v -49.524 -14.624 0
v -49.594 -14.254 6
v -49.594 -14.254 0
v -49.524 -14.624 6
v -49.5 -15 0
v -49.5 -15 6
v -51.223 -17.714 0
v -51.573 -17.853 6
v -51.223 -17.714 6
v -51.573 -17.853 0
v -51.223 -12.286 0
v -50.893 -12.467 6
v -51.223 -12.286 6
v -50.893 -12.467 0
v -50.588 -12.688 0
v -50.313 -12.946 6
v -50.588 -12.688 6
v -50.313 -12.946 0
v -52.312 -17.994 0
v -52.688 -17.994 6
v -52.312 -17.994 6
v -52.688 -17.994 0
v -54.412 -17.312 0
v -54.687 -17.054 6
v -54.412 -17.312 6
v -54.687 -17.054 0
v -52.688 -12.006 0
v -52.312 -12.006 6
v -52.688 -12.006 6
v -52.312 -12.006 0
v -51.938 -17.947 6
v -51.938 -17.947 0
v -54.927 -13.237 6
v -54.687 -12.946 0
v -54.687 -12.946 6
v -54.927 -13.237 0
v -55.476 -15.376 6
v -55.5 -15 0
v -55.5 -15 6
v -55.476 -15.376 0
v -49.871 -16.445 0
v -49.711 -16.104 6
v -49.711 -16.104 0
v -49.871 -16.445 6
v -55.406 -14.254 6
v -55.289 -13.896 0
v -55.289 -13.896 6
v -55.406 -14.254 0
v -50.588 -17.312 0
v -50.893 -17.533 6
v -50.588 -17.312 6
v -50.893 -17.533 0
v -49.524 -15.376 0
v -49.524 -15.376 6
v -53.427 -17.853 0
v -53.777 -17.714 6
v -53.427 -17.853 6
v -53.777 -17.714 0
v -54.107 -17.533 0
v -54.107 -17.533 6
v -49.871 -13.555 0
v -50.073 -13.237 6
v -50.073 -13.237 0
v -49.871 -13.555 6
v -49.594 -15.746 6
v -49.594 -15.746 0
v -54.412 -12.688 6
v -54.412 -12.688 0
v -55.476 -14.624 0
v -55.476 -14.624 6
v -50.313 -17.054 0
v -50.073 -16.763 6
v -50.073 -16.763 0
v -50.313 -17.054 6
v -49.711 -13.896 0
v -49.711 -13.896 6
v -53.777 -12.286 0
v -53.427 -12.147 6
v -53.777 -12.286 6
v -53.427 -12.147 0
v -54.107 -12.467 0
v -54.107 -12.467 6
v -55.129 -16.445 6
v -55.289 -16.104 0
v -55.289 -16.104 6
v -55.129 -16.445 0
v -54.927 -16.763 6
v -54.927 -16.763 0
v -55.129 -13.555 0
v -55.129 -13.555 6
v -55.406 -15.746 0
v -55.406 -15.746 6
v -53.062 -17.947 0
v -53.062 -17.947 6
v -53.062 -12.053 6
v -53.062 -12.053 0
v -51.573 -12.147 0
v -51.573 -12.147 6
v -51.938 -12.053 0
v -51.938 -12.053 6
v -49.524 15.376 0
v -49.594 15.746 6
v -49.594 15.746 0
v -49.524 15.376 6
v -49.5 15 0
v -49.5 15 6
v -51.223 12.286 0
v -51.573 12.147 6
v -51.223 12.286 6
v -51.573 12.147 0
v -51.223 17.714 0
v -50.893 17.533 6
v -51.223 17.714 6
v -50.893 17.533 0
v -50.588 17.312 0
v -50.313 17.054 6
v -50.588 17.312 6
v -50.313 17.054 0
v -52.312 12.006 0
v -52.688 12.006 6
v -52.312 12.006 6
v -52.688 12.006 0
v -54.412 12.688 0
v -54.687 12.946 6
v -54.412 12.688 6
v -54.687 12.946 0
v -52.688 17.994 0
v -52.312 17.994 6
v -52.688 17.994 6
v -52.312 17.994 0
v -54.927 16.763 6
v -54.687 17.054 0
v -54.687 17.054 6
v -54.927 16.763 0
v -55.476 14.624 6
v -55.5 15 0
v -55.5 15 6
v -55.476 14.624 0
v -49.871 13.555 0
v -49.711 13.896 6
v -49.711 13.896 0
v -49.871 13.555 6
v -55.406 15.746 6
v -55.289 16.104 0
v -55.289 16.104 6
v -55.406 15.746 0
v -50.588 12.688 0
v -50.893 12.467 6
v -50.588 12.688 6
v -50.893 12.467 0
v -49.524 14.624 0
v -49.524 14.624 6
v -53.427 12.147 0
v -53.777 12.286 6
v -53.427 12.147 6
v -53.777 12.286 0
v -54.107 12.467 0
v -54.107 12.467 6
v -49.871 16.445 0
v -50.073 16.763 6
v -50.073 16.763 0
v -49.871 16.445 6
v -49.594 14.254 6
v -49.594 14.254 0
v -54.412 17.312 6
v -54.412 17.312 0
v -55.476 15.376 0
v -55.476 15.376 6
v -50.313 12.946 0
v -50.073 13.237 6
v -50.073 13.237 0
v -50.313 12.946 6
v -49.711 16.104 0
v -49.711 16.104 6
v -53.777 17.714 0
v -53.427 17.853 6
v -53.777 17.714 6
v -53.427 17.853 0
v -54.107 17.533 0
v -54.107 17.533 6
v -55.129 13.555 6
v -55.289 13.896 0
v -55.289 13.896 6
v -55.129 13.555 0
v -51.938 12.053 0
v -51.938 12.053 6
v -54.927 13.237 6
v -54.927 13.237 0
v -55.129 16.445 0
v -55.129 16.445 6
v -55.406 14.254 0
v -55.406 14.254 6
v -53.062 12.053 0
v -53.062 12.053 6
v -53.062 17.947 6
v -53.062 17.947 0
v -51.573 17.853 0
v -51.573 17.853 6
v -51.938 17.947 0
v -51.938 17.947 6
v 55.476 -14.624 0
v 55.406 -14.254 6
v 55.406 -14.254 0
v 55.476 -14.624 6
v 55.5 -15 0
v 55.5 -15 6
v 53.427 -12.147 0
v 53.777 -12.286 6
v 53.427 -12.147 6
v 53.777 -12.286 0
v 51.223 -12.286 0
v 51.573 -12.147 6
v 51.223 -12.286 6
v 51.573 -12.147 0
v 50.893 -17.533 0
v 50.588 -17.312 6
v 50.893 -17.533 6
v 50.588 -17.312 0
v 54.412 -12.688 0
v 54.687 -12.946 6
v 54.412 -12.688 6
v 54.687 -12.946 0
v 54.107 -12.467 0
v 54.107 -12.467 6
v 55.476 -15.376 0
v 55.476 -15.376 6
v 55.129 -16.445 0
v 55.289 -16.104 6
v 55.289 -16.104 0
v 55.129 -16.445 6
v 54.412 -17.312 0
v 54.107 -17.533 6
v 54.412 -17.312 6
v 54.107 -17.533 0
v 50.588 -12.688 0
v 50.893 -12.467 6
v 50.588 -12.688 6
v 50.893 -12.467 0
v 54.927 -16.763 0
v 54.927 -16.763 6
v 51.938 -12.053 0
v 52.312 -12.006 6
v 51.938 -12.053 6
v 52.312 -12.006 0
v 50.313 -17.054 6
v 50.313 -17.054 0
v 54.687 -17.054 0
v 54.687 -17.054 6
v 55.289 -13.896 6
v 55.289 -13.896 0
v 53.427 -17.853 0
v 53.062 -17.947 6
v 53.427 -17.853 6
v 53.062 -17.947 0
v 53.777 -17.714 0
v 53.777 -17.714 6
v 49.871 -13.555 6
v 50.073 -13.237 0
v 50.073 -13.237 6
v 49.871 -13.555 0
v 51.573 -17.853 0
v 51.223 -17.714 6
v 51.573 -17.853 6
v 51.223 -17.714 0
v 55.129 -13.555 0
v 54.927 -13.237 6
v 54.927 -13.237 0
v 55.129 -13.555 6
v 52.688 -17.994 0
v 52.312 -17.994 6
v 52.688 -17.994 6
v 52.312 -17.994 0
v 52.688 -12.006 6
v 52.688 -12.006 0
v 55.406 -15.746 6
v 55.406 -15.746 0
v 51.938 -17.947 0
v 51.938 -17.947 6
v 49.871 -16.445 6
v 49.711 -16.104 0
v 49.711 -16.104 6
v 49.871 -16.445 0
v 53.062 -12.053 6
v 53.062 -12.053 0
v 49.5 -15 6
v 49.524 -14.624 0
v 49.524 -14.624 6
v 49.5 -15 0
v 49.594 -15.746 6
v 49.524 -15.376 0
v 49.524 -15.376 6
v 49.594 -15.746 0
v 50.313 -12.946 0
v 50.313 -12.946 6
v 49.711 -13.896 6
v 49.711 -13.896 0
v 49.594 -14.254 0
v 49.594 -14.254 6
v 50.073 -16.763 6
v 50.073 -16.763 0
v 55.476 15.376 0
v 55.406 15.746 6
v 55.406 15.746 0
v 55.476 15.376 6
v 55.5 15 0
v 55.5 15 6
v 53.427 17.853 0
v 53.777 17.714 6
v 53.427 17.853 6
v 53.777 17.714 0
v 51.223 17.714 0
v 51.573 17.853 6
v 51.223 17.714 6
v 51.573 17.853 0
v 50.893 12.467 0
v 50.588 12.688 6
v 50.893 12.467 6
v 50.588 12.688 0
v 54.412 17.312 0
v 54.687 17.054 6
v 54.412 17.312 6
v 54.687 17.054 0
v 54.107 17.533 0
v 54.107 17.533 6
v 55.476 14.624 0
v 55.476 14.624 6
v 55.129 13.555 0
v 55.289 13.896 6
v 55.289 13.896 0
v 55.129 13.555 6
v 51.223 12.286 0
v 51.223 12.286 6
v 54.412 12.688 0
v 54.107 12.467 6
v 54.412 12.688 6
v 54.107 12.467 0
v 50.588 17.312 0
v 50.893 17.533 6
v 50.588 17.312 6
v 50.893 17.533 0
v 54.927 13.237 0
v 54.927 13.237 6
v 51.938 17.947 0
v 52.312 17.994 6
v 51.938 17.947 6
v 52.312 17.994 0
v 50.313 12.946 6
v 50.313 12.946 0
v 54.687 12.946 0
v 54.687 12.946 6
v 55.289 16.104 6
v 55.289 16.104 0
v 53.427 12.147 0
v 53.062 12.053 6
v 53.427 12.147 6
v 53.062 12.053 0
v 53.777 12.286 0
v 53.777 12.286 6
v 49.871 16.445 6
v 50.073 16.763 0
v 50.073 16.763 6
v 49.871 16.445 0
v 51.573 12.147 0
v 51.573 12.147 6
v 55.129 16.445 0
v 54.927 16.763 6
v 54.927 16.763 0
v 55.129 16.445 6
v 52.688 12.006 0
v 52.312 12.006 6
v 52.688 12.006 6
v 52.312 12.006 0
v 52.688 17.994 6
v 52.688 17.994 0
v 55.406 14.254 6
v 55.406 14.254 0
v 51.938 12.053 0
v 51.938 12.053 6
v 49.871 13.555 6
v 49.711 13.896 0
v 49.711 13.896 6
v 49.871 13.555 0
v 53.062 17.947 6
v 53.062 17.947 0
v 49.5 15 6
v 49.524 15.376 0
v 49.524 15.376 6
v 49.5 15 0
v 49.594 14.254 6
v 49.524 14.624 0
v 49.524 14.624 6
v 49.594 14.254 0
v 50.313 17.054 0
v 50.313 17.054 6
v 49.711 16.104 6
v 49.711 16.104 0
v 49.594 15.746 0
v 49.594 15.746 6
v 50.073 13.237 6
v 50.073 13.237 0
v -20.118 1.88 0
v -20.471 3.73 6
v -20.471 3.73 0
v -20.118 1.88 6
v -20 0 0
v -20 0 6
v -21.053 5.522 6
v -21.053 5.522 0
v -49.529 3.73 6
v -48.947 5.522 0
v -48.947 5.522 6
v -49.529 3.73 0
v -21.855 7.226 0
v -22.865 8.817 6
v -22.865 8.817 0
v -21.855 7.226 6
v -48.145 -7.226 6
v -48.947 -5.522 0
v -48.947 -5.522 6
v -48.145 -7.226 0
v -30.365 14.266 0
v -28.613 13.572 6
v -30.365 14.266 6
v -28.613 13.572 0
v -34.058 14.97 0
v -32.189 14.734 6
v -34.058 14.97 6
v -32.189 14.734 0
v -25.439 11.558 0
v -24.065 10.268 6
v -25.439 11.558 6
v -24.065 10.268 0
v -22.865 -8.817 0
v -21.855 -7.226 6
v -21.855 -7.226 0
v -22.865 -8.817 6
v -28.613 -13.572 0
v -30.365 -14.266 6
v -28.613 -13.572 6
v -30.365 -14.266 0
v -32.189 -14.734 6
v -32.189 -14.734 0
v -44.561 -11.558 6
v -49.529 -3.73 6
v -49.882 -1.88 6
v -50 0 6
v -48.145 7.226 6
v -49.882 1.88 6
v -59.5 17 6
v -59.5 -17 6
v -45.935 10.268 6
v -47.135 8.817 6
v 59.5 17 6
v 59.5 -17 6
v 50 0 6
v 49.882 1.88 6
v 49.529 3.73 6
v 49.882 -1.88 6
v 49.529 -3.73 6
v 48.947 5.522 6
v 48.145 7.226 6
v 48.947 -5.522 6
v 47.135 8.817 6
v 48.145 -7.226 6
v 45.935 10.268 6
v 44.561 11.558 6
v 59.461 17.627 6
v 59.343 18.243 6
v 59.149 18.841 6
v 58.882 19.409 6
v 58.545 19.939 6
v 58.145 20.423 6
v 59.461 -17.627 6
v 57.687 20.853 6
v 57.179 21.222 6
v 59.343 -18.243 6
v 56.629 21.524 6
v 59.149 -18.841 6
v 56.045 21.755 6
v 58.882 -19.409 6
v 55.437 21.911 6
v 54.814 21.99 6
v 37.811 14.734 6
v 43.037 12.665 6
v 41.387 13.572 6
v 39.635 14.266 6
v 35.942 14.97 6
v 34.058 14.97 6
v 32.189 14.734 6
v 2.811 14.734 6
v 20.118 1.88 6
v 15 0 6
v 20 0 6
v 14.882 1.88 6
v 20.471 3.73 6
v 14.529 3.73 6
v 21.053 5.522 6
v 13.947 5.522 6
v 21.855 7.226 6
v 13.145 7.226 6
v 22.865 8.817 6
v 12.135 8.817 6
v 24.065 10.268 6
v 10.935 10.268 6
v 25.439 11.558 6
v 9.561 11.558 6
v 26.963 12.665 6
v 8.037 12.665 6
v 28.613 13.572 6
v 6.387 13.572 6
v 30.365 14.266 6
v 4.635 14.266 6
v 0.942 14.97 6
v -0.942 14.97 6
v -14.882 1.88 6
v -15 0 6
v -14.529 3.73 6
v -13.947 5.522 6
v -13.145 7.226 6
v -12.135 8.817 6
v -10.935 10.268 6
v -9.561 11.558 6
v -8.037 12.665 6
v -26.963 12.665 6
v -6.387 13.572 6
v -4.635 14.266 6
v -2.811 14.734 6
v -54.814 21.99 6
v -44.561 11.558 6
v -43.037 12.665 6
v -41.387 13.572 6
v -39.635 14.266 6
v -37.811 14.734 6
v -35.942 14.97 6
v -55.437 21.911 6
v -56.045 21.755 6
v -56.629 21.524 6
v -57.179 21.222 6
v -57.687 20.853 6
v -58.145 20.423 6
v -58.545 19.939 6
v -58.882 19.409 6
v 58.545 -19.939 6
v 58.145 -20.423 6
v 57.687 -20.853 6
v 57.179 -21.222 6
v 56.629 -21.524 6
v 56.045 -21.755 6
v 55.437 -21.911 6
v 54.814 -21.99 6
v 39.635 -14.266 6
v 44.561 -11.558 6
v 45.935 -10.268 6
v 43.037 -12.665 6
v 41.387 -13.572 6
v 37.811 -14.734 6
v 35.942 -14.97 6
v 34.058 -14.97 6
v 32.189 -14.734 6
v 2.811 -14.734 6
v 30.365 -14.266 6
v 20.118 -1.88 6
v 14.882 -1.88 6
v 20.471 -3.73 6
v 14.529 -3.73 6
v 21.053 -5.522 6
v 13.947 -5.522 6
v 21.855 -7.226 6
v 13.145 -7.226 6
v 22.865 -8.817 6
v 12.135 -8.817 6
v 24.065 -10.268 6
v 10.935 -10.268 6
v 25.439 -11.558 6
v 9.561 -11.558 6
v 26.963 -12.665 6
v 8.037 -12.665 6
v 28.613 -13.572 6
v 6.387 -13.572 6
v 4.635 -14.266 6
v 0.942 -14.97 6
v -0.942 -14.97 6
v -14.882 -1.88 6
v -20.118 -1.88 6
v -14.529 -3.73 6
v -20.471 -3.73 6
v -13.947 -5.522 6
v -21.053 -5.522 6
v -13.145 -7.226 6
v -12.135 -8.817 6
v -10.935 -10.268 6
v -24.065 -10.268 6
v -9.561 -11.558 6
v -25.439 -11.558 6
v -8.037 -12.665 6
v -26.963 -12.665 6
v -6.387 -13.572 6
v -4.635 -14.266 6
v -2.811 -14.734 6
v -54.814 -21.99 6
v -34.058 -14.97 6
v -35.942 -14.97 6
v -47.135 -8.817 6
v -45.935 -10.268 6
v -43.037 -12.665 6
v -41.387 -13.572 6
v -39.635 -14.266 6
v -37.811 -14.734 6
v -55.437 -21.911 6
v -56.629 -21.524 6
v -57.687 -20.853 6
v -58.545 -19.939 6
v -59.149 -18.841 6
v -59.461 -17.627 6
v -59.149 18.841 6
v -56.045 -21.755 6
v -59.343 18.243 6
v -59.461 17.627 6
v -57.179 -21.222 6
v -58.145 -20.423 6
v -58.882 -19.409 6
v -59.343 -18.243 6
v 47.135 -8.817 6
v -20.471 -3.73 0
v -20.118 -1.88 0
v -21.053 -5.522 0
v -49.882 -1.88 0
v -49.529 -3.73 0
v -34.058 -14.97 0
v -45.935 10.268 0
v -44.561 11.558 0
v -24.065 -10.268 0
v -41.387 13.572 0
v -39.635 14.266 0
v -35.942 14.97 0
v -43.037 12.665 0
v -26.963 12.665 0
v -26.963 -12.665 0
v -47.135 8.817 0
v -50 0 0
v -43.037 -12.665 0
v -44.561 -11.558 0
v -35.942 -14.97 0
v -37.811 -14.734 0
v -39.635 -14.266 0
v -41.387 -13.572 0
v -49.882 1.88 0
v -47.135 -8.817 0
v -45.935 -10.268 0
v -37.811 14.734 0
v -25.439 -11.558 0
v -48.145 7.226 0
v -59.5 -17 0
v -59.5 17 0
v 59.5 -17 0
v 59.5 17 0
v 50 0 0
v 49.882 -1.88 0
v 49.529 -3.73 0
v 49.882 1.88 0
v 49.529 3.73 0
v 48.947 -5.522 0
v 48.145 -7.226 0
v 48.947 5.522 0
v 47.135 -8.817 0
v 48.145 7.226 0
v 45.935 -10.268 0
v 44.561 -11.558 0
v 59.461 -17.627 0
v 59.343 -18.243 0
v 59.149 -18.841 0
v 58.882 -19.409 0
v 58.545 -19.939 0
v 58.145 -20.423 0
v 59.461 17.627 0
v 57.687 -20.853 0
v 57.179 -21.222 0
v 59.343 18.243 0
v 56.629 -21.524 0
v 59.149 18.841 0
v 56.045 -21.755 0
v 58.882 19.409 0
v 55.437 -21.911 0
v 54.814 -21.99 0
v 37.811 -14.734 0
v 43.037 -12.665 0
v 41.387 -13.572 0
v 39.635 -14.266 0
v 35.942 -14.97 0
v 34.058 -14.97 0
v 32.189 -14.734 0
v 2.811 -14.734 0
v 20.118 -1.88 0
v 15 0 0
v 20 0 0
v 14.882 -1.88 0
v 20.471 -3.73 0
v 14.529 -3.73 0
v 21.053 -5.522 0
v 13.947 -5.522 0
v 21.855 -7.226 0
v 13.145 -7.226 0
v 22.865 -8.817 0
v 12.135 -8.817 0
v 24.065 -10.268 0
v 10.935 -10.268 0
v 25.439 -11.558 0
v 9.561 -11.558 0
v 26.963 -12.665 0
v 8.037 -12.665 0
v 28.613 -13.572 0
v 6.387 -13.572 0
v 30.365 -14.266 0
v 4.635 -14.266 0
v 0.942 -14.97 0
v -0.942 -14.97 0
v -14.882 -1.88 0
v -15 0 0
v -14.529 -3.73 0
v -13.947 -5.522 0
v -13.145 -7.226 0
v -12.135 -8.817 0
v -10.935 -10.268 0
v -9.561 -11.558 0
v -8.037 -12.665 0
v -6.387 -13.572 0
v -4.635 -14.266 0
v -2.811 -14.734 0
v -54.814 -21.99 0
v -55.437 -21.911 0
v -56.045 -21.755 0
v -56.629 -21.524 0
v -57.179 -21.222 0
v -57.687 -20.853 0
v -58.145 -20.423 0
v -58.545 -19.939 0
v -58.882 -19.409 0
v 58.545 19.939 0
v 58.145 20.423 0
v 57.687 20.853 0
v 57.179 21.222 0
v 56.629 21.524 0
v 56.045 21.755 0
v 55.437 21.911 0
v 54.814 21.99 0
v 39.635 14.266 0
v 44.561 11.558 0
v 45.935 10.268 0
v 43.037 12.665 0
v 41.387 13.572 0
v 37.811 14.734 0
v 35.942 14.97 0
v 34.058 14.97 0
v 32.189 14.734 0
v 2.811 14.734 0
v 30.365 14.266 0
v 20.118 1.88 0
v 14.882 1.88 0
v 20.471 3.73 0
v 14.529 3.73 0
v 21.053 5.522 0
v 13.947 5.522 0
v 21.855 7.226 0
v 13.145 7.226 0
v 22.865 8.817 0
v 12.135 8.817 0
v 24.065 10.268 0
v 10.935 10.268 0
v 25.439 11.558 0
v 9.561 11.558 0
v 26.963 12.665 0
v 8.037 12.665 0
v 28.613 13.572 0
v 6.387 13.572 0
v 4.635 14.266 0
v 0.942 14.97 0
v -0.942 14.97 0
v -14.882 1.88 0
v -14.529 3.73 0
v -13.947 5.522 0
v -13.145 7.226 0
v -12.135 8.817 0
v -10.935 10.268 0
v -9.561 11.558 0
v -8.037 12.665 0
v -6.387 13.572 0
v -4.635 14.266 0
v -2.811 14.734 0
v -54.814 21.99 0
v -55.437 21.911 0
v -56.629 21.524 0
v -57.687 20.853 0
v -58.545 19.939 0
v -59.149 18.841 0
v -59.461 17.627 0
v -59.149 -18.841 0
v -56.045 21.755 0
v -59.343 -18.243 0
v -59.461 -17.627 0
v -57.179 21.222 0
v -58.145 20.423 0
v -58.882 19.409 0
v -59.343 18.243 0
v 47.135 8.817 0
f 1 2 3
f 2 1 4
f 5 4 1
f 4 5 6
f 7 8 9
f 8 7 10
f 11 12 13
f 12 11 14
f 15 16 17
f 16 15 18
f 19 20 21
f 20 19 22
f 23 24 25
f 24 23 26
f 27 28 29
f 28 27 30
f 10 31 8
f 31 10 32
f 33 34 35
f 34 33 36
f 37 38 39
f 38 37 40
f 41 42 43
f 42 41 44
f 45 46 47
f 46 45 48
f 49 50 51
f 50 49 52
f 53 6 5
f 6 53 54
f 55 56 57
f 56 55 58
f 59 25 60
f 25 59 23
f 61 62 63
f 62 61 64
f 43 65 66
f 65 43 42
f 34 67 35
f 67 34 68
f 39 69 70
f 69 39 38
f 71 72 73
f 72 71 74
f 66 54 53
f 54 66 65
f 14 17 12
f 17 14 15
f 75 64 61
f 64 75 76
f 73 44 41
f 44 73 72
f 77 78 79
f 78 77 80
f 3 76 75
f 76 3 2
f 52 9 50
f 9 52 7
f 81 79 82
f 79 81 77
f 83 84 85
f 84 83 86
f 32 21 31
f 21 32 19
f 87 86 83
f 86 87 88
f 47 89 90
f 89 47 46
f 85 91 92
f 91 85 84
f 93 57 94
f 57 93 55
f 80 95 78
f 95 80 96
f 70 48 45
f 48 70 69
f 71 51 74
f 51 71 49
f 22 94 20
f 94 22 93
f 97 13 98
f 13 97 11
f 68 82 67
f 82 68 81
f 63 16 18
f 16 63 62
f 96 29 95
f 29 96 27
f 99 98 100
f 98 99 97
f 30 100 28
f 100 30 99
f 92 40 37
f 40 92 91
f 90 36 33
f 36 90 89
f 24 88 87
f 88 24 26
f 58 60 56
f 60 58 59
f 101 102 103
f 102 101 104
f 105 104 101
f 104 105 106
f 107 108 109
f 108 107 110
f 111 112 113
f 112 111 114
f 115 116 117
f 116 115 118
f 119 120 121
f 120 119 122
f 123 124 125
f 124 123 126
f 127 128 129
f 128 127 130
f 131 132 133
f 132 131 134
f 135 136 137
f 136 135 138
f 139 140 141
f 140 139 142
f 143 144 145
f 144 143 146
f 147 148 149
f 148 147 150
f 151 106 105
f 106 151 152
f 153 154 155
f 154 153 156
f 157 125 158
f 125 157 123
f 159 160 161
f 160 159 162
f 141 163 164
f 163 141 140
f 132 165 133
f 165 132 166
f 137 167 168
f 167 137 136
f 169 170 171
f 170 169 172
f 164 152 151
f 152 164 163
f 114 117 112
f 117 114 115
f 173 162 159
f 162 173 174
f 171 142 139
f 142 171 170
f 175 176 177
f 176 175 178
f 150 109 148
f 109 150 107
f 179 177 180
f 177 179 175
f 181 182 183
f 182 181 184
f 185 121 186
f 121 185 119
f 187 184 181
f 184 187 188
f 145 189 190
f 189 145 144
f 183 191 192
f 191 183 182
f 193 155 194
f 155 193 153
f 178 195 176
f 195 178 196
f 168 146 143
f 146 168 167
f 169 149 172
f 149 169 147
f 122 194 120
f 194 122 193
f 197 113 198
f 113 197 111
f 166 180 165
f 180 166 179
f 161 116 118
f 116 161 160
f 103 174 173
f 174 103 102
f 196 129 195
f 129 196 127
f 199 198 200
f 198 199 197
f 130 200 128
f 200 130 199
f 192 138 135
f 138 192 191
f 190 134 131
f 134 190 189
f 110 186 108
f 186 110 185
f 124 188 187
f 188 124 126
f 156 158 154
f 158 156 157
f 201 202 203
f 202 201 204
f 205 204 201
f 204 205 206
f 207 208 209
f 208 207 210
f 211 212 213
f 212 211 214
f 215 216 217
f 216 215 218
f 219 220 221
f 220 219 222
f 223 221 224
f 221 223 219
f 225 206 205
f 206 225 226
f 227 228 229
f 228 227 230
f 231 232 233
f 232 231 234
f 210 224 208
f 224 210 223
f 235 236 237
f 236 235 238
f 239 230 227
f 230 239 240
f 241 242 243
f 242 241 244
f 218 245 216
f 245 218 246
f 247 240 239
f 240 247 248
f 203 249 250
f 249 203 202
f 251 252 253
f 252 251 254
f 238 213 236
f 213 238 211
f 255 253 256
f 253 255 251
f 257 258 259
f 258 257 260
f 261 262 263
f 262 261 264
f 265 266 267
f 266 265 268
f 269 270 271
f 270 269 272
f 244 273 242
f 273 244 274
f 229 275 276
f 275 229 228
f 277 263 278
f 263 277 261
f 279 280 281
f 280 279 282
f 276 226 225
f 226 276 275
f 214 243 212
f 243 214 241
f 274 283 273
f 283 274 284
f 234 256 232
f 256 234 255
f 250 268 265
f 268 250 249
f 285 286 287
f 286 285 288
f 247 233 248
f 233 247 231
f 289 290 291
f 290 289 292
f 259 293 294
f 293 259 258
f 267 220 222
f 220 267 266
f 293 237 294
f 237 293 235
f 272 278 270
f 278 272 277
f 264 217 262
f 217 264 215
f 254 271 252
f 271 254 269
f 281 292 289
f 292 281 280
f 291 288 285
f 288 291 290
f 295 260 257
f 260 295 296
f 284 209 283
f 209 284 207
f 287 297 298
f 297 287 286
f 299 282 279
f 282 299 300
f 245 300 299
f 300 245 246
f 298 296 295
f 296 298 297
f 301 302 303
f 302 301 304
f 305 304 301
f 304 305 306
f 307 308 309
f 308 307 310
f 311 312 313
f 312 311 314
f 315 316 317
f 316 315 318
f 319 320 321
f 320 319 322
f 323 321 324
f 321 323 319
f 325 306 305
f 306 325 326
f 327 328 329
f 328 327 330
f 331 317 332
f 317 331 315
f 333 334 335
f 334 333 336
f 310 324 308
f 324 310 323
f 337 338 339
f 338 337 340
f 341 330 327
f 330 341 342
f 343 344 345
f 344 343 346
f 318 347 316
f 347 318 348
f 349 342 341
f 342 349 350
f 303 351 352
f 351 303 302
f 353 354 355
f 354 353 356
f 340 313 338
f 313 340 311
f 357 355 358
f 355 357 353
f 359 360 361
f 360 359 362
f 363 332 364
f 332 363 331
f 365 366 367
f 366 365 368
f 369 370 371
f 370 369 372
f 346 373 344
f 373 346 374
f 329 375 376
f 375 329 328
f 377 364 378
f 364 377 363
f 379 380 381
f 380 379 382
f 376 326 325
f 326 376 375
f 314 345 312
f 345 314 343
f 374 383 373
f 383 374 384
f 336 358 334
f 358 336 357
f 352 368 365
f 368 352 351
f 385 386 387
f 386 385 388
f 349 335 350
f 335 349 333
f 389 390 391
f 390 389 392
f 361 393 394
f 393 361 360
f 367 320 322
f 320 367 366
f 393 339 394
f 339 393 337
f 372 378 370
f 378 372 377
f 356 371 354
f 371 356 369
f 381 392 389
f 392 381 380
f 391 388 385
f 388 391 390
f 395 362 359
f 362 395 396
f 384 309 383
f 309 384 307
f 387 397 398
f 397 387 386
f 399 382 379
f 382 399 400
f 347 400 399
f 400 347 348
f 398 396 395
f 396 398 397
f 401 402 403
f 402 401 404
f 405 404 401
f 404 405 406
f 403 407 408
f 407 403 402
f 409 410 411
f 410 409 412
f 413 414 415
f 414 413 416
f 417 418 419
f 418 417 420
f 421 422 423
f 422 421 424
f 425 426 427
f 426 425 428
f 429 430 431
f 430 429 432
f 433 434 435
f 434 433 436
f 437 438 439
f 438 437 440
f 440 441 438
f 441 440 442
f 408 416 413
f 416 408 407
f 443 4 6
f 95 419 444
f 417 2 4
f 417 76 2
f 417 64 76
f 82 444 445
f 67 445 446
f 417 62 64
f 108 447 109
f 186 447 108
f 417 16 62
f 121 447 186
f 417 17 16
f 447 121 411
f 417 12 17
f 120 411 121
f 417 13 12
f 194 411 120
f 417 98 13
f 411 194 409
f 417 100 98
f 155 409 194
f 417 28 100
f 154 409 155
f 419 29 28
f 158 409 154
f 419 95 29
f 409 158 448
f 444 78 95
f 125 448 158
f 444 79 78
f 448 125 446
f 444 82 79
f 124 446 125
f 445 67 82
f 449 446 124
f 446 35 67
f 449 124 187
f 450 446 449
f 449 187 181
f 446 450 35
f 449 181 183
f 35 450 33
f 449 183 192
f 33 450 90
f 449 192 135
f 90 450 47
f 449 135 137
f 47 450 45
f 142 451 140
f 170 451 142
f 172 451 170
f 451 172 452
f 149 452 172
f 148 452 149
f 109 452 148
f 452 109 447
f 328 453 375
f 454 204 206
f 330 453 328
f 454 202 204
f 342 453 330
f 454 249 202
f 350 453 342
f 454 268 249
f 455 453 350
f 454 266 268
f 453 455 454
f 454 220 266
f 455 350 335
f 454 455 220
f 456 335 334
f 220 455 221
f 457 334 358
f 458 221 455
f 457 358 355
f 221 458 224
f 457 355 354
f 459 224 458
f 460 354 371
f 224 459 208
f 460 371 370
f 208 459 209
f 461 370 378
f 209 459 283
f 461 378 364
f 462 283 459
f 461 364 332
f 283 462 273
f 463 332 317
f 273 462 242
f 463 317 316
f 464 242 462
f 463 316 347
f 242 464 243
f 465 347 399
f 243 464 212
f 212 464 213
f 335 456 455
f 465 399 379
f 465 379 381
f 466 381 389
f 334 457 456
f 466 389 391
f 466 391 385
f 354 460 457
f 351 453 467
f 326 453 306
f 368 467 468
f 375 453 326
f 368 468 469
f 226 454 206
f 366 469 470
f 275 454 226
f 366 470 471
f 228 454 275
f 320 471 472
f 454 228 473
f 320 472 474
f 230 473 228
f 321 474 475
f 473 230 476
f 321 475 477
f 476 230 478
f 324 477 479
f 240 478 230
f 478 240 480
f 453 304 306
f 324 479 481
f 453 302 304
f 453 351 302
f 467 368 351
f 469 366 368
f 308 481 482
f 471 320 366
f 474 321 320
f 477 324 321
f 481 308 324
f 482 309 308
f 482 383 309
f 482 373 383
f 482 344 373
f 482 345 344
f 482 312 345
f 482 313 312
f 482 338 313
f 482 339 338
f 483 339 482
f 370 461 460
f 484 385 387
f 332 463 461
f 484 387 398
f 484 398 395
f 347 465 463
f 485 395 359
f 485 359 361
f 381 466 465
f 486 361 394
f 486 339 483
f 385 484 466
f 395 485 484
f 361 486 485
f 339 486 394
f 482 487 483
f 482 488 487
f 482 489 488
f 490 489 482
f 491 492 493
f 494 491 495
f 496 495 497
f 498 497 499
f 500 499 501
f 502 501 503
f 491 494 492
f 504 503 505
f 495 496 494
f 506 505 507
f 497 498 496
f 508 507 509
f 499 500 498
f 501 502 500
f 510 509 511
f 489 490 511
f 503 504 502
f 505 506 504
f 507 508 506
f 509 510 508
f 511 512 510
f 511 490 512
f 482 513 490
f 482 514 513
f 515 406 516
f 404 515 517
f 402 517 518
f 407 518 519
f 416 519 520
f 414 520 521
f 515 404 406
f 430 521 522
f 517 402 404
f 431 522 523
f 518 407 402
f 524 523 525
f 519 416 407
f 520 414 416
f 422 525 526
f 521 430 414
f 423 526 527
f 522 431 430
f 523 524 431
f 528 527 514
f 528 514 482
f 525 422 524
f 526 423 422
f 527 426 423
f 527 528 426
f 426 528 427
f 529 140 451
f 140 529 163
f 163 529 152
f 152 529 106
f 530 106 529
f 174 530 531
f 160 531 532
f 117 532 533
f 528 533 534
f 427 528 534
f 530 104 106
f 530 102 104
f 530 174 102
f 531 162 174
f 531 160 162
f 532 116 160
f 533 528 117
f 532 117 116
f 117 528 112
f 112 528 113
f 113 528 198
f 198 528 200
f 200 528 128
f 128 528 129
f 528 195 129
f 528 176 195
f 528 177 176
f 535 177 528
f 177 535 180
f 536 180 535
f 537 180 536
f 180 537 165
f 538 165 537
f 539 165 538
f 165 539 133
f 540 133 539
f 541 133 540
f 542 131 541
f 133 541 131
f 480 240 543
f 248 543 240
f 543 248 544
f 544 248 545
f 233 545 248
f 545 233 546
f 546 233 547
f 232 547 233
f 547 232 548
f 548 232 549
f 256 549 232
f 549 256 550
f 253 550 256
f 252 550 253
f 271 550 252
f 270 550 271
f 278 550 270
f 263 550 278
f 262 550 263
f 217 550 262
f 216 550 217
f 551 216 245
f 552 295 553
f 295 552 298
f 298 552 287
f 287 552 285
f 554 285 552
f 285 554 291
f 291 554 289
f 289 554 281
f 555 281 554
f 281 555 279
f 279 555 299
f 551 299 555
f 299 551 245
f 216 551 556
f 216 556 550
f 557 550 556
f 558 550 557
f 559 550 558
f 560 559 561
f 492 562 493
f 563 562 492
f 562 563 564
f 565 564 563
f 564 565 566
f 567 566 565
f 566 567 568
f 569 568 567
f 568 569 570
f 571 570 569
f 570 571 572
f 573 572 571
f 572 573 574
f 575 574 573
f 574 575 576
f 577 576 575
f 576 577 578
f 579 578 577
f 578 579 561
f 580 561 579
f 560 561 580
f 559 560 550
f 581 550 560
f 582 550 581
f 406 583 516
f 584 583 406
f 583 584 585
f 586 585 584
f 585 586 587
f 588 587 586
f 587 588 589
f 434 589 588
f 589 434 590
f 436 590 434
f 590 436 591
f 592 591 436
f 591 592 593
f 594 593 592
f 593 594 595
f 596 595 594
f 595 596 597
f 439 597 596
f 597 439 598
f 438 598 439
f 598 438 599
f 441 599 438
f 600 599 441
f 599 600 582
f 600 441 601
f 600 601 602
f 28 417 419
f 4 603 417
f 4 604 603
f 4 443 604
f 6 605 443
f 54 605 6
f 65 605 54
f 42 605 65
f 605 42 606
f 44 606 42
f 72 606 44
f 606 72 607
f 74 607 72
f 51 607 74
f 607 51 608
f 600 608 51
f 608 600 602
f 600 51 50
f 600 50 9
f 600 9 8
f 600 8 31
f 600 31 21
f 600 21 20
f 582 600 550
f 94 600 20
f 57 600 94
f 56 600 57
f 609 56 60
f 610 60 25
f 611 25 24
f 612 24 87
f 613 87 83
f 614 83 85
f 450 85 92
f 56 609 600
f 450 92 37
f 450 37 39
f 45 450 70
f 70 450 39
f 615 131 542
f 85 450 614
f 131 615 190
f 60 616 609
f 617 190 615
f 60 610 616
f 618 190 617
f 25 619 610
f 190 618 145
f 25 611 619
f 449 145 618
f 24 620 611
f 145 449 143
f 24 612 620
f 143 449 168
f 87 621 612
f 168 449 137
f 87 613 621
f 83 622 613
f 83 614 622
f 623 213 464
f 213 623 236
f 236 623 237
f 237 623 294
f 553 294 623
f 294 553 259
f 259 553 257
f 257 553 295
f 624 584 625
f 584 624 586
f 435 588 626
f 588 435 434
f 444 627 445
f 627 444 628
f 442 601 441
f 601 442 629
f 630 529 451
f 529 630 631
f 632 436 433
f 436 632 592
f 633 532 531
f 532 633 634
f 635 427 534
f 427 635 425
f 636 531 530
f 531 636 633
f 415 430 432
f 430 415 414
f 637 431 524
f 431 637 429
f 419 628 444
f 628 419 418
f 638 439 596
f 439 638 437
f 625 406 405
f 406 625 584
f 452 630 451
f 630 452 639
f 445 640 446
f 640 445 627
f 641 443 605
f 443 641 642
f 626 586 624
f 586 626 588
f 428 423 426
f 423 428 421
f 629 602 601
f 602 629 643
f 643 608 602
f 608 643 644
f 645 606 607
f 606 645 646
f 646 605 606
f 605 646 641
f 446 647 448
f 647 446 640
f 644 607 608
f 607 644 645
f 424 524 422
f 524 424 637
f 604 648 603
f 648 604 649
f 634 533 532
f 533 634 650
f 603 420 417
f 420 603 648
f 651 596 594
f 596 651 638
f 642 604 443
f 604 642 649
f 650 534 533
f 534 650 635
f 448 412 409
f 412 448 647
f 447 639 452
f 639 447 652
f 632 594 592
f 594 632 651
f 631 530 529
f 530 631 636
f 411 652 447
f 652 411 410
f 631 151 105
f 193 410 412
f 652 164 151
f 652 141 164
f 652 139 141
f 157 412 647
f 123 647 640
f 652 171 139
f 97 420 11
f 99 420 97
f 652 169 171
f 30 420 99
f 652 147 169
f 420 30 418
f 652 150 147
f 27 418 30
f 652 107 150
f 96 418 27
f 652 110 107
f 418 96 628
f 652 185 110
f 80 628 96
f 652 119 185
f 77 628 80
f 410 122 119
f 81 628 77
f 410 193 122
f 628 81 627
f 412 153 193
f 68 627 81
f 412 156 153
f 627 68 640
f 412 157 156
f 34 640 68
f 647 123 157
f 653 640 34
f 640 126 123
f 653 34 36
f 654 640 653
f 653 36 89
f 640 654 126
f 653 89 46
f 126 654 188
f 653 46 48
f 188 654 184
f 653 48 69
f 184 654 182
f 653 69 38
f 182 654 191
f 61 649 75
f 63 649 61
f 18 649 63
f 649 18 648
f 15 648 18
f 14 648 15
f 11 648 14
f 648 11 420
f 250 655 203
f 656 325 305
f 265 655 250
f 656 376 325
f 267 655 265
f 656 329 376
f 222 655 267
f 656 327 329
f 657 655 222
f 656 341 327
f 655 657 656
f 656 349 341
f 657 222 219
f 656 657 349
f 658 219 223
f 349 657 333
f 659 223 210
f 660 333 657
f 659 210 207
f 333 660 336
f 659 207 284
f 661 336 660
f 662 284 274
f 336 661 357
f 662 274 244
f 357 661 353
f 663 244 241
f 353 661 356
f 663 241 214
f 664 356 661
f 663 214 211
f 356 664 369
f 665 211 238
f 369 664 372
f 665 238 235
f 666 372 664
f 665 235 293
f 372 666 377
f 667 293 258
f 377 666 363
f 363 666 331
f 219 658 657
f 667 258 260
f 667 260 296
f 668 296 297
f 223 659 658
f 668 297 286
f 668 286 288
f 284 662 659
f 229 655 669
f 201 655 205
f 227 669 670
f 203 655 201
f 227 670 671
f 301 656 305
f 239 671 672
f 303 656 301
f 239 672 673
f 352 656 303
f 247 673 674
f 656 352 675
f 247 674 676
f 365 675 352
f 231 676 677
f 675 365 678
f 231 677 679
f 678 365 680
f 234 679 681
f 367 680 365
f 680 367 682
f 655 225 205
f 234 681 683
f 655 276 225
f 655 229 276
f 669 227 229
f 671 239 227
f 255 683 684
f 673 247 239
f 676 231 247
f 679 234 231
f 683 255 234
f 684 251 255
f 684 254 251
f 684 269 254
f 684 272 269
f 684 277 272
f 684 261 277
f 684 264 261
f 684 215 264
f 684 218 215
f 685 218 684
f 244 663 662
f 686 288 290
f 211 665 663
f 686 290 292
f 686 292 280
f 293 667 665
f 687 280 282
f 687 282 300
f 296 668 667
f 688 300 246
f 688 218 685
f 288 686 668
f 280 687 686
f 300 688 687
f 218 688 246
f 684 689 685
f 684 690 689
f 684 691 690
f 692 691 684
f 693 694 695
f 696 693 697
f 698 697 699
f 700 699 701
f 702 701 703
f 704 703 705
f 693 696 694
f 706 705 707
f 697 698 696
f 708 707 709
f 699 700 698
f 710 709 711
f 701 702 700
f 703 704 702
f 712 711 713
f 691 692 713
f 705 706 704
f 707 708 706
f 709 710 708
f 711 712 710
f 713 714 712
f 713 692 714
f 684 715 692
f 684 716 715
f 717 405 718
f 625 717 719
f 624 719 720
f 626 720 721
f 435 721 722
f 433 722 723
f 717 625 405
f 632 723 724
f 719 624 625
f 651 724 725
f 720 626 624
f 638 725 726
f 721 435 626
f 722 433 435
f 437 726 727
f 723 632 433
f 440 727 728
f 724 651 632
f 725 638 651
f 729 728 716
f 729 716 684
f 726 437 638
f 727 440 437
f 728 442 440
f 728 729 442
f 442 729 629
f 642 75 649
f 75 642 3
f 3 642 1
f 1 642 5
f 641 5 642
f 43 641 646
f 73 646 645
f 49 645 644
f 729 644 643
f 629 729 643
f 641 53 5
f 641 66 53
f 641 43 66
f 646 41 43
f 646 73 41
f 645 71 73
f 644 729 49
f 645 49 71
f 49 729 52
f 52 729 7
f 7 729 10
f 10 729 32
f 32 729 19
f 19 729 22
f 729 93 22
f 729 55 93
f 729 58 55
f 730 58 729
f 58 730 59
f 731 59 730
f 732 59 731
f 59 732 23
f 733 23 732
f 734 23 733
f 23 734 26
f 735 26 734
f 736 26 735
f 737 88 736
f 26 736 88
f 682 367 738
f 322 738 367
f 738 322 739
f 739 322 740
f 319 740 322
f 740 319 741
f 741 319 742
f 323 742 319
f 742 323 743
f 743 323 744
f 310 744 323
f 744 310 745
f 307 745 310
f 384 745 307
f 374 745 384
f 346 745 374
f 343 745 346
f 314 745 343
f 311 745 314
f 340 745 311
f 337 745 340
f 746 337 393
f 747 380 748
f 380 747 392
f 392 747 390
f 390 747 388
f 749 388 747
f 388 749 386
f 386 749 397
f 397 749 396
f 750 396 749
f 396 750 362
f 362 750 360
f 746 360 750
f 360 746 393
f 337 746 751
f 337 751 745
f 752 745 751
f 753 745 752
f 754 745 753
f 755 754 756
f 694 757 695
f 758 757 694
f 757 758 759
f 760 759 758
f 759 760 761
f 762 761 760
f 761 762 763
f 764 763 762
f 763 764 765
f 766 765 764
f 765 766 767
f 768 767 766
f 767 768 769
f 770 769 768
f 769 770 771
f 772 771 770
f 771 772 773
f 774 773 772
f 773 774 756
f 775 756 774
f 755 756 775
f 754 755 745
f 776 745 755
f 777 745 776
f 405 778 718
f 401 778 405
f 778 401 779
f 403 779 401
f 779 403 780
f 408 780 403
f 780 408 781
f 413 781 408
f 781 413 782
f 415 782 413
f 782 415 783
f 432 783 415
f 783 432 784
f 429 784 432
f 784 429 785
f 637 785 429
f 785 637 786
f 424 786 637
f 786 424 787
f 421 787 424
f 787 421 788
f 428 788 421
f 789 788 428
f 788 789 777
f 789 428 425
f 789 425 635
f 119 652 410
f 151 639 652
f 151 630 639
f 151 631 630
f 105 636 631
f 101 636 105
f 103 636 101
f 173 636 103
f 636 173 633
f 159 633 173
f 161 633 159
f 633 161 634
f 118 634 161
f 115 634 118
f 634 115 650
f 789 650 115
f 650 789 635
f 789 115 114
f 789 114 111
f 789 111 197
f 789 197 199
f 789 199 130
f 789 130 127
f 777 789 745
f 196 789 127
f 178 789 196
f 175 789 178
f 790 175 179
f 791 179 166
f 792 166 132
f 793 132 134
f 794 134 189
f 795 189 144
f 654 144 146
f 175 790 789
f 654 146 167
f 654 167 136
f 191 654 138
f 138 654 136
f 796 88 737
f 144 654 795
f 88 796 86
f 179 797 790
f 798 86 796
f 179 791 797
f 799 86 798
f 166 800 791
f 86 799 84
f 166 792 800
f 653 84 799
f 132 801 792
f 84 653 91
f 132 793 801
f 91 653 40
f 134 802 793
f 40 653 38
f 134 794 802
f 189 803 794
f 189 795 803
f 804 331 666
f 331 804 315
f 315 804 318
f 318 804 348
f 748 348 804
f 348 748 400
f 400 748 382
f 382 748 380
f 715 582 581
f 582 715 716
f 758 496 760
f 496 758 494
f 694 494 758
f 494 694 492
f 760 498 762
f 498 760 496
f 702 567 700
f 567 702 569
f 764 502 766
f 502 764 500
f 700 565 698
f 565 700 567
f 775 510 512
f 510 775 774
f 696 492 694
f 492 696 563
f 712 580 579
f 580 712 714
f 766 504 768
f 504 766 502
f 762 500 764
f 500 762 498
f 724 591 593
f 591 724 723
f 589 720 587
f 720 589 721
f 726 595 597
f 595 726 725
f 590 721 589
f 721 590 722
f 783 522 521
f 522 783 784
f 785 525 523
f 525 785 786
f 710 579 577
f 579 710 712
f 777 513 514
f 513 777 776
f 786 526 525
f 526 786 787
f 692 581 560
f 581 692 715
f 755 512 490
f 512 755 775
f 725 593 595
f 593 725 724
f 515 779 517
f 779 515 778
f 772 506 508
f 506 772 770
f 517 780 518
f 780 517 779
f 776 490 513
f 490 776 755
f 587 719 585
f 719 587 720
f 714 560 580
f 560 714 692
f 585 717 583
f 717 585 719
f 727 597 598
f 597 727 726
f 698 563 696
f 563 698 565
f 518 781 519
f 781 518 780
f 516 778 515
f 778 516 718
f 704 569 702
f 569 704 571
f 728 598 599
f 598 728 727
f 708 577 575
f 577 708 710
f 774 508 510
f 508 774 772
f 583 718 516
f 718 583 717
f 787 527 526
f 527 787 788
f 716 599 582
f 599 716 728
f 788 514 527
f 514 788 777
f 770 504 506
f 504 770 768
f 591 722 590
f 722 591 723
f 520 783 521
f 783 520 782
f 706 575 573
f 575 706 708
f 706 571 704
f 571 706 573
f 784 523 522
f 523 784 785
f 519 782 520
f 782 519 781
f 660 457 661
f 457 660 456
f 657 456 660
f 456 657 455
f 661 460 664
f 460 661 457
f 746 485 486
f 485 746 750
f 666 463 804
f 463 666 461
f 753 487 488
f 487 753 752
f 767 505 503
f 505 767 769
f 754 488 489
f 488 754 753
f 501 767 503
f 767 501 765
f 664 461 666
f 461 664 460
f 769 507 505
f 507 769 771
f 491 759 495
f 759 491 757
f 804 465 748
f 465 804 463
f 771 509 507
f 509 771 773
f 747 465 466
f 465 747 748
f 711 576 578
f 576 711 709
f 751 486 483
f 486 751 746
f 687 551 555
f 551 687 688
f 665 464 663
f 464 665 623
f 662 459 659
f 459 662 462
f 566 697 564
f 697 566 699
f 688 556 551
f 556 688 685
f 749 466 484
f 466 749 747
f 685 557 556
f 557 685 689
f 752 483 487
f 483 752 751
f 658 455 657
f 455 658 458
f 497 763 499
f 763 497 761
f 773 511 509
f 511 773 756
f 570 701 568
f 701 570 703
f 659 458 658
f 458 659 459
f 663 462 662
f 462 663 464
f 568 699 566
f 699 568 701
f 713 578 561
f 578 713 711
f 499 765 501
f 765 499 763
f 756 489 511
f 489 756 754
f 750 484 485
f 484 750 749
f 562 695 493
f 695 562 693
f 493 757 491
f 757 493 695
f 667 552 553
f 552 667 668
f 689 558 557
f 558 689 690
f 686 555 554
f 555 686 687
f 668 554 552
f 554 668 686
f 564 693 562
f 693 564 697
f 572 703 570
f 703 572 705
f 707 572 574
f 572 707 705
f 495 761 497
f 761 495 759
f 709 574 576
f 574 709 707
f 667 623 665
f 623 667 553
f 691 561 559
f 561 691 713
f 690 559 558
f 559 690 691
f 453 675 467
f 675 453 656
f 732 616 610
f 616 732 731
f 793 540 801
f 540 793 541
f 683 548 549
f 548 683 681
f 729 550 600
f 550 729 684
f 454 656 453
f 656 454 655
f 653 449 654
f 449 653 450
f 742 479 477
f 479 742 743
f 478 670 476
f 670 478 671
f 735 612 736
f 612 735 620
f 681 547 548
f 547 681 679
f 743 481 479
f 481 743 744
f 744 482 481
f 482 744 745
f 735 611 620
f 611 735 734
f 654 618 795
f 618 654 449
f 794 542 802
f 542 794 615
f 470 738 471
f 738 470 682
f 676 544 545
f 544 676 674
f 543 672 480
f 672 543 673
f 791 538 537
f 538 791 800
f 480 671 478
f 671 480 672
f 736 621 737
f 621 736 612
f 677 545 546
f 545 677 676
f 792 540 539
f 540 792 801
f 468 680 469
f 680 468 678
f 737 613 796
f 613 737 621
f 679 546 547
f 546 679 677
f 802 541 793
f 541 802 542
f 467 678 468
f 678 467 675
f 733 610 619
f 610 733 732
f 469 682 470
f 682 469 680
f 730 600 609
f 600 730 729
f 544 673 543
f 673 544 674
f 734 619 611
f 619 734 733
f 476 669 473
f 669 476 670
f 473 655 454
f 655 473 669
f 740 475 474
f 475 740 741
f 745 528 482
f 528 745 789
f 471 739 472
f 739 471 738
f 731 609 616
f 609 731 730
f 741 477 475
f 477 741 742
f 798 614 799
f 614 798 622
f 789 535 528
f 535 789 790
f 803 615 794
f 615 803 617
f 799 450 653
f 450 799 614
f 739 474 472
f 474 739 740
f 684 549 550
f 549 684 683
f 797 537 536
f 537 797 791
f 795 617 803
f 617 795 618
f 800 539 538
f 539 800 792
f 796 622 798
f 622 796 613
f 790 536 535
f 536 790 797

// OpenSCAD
$fn = 50;


difference() {
	union() {
		hull() {
			translate(v = [-54.5000000000, 17.0000000000, 0]) {
				cylinder(h = 6, r = 5);
			}
			translate(v = [54.5000000000, 17.0000000000, 0]) {
				cylinder(h = 6, r = 5);
			}
			translate(v = [-54.5000000000, -17.0000000000, 0]) {
				cylinder(h = 6, r = 5);
			}
			translate(v = [54.5000000000, -17.0000000000, 0]) {
				cylinder(h = 6, r = 5);
			}
		}
	}
	union() {
		#translate(v = [-52.5000000000, -15.0000000000, -100.0000000000]) {
			cylinder(h = 200, r = 3.0000000000);
		}
		#translate(v = [-52.5000000000, 15.0000000000, -100.0000000000]) {
			cylinder(h = 200, r = 3.0000000000);
		}
		#translate(v = [52.5000000000, -15.0000000000, -100.0000000000]) {
			cylinder(h = 200, r = 3.0000000000);
		}
		#translate(v = [52.5000000000, 15.0000000000, -100.0000000000]) {
			cylinder(h = 200, r = 3.0000000000);
		}
		#translate(v = [-35.0000000000, 0, 0]) {
			cylinder(h = 6, r = 15.0000000000);
		}
		#cylinder(h = 6, r = 15.0000000000);
		#translate(v = [35.0000000000, 0, 0]) {
			cylinder(h = 6, r = 15.0000000000);
		}
	}
}
